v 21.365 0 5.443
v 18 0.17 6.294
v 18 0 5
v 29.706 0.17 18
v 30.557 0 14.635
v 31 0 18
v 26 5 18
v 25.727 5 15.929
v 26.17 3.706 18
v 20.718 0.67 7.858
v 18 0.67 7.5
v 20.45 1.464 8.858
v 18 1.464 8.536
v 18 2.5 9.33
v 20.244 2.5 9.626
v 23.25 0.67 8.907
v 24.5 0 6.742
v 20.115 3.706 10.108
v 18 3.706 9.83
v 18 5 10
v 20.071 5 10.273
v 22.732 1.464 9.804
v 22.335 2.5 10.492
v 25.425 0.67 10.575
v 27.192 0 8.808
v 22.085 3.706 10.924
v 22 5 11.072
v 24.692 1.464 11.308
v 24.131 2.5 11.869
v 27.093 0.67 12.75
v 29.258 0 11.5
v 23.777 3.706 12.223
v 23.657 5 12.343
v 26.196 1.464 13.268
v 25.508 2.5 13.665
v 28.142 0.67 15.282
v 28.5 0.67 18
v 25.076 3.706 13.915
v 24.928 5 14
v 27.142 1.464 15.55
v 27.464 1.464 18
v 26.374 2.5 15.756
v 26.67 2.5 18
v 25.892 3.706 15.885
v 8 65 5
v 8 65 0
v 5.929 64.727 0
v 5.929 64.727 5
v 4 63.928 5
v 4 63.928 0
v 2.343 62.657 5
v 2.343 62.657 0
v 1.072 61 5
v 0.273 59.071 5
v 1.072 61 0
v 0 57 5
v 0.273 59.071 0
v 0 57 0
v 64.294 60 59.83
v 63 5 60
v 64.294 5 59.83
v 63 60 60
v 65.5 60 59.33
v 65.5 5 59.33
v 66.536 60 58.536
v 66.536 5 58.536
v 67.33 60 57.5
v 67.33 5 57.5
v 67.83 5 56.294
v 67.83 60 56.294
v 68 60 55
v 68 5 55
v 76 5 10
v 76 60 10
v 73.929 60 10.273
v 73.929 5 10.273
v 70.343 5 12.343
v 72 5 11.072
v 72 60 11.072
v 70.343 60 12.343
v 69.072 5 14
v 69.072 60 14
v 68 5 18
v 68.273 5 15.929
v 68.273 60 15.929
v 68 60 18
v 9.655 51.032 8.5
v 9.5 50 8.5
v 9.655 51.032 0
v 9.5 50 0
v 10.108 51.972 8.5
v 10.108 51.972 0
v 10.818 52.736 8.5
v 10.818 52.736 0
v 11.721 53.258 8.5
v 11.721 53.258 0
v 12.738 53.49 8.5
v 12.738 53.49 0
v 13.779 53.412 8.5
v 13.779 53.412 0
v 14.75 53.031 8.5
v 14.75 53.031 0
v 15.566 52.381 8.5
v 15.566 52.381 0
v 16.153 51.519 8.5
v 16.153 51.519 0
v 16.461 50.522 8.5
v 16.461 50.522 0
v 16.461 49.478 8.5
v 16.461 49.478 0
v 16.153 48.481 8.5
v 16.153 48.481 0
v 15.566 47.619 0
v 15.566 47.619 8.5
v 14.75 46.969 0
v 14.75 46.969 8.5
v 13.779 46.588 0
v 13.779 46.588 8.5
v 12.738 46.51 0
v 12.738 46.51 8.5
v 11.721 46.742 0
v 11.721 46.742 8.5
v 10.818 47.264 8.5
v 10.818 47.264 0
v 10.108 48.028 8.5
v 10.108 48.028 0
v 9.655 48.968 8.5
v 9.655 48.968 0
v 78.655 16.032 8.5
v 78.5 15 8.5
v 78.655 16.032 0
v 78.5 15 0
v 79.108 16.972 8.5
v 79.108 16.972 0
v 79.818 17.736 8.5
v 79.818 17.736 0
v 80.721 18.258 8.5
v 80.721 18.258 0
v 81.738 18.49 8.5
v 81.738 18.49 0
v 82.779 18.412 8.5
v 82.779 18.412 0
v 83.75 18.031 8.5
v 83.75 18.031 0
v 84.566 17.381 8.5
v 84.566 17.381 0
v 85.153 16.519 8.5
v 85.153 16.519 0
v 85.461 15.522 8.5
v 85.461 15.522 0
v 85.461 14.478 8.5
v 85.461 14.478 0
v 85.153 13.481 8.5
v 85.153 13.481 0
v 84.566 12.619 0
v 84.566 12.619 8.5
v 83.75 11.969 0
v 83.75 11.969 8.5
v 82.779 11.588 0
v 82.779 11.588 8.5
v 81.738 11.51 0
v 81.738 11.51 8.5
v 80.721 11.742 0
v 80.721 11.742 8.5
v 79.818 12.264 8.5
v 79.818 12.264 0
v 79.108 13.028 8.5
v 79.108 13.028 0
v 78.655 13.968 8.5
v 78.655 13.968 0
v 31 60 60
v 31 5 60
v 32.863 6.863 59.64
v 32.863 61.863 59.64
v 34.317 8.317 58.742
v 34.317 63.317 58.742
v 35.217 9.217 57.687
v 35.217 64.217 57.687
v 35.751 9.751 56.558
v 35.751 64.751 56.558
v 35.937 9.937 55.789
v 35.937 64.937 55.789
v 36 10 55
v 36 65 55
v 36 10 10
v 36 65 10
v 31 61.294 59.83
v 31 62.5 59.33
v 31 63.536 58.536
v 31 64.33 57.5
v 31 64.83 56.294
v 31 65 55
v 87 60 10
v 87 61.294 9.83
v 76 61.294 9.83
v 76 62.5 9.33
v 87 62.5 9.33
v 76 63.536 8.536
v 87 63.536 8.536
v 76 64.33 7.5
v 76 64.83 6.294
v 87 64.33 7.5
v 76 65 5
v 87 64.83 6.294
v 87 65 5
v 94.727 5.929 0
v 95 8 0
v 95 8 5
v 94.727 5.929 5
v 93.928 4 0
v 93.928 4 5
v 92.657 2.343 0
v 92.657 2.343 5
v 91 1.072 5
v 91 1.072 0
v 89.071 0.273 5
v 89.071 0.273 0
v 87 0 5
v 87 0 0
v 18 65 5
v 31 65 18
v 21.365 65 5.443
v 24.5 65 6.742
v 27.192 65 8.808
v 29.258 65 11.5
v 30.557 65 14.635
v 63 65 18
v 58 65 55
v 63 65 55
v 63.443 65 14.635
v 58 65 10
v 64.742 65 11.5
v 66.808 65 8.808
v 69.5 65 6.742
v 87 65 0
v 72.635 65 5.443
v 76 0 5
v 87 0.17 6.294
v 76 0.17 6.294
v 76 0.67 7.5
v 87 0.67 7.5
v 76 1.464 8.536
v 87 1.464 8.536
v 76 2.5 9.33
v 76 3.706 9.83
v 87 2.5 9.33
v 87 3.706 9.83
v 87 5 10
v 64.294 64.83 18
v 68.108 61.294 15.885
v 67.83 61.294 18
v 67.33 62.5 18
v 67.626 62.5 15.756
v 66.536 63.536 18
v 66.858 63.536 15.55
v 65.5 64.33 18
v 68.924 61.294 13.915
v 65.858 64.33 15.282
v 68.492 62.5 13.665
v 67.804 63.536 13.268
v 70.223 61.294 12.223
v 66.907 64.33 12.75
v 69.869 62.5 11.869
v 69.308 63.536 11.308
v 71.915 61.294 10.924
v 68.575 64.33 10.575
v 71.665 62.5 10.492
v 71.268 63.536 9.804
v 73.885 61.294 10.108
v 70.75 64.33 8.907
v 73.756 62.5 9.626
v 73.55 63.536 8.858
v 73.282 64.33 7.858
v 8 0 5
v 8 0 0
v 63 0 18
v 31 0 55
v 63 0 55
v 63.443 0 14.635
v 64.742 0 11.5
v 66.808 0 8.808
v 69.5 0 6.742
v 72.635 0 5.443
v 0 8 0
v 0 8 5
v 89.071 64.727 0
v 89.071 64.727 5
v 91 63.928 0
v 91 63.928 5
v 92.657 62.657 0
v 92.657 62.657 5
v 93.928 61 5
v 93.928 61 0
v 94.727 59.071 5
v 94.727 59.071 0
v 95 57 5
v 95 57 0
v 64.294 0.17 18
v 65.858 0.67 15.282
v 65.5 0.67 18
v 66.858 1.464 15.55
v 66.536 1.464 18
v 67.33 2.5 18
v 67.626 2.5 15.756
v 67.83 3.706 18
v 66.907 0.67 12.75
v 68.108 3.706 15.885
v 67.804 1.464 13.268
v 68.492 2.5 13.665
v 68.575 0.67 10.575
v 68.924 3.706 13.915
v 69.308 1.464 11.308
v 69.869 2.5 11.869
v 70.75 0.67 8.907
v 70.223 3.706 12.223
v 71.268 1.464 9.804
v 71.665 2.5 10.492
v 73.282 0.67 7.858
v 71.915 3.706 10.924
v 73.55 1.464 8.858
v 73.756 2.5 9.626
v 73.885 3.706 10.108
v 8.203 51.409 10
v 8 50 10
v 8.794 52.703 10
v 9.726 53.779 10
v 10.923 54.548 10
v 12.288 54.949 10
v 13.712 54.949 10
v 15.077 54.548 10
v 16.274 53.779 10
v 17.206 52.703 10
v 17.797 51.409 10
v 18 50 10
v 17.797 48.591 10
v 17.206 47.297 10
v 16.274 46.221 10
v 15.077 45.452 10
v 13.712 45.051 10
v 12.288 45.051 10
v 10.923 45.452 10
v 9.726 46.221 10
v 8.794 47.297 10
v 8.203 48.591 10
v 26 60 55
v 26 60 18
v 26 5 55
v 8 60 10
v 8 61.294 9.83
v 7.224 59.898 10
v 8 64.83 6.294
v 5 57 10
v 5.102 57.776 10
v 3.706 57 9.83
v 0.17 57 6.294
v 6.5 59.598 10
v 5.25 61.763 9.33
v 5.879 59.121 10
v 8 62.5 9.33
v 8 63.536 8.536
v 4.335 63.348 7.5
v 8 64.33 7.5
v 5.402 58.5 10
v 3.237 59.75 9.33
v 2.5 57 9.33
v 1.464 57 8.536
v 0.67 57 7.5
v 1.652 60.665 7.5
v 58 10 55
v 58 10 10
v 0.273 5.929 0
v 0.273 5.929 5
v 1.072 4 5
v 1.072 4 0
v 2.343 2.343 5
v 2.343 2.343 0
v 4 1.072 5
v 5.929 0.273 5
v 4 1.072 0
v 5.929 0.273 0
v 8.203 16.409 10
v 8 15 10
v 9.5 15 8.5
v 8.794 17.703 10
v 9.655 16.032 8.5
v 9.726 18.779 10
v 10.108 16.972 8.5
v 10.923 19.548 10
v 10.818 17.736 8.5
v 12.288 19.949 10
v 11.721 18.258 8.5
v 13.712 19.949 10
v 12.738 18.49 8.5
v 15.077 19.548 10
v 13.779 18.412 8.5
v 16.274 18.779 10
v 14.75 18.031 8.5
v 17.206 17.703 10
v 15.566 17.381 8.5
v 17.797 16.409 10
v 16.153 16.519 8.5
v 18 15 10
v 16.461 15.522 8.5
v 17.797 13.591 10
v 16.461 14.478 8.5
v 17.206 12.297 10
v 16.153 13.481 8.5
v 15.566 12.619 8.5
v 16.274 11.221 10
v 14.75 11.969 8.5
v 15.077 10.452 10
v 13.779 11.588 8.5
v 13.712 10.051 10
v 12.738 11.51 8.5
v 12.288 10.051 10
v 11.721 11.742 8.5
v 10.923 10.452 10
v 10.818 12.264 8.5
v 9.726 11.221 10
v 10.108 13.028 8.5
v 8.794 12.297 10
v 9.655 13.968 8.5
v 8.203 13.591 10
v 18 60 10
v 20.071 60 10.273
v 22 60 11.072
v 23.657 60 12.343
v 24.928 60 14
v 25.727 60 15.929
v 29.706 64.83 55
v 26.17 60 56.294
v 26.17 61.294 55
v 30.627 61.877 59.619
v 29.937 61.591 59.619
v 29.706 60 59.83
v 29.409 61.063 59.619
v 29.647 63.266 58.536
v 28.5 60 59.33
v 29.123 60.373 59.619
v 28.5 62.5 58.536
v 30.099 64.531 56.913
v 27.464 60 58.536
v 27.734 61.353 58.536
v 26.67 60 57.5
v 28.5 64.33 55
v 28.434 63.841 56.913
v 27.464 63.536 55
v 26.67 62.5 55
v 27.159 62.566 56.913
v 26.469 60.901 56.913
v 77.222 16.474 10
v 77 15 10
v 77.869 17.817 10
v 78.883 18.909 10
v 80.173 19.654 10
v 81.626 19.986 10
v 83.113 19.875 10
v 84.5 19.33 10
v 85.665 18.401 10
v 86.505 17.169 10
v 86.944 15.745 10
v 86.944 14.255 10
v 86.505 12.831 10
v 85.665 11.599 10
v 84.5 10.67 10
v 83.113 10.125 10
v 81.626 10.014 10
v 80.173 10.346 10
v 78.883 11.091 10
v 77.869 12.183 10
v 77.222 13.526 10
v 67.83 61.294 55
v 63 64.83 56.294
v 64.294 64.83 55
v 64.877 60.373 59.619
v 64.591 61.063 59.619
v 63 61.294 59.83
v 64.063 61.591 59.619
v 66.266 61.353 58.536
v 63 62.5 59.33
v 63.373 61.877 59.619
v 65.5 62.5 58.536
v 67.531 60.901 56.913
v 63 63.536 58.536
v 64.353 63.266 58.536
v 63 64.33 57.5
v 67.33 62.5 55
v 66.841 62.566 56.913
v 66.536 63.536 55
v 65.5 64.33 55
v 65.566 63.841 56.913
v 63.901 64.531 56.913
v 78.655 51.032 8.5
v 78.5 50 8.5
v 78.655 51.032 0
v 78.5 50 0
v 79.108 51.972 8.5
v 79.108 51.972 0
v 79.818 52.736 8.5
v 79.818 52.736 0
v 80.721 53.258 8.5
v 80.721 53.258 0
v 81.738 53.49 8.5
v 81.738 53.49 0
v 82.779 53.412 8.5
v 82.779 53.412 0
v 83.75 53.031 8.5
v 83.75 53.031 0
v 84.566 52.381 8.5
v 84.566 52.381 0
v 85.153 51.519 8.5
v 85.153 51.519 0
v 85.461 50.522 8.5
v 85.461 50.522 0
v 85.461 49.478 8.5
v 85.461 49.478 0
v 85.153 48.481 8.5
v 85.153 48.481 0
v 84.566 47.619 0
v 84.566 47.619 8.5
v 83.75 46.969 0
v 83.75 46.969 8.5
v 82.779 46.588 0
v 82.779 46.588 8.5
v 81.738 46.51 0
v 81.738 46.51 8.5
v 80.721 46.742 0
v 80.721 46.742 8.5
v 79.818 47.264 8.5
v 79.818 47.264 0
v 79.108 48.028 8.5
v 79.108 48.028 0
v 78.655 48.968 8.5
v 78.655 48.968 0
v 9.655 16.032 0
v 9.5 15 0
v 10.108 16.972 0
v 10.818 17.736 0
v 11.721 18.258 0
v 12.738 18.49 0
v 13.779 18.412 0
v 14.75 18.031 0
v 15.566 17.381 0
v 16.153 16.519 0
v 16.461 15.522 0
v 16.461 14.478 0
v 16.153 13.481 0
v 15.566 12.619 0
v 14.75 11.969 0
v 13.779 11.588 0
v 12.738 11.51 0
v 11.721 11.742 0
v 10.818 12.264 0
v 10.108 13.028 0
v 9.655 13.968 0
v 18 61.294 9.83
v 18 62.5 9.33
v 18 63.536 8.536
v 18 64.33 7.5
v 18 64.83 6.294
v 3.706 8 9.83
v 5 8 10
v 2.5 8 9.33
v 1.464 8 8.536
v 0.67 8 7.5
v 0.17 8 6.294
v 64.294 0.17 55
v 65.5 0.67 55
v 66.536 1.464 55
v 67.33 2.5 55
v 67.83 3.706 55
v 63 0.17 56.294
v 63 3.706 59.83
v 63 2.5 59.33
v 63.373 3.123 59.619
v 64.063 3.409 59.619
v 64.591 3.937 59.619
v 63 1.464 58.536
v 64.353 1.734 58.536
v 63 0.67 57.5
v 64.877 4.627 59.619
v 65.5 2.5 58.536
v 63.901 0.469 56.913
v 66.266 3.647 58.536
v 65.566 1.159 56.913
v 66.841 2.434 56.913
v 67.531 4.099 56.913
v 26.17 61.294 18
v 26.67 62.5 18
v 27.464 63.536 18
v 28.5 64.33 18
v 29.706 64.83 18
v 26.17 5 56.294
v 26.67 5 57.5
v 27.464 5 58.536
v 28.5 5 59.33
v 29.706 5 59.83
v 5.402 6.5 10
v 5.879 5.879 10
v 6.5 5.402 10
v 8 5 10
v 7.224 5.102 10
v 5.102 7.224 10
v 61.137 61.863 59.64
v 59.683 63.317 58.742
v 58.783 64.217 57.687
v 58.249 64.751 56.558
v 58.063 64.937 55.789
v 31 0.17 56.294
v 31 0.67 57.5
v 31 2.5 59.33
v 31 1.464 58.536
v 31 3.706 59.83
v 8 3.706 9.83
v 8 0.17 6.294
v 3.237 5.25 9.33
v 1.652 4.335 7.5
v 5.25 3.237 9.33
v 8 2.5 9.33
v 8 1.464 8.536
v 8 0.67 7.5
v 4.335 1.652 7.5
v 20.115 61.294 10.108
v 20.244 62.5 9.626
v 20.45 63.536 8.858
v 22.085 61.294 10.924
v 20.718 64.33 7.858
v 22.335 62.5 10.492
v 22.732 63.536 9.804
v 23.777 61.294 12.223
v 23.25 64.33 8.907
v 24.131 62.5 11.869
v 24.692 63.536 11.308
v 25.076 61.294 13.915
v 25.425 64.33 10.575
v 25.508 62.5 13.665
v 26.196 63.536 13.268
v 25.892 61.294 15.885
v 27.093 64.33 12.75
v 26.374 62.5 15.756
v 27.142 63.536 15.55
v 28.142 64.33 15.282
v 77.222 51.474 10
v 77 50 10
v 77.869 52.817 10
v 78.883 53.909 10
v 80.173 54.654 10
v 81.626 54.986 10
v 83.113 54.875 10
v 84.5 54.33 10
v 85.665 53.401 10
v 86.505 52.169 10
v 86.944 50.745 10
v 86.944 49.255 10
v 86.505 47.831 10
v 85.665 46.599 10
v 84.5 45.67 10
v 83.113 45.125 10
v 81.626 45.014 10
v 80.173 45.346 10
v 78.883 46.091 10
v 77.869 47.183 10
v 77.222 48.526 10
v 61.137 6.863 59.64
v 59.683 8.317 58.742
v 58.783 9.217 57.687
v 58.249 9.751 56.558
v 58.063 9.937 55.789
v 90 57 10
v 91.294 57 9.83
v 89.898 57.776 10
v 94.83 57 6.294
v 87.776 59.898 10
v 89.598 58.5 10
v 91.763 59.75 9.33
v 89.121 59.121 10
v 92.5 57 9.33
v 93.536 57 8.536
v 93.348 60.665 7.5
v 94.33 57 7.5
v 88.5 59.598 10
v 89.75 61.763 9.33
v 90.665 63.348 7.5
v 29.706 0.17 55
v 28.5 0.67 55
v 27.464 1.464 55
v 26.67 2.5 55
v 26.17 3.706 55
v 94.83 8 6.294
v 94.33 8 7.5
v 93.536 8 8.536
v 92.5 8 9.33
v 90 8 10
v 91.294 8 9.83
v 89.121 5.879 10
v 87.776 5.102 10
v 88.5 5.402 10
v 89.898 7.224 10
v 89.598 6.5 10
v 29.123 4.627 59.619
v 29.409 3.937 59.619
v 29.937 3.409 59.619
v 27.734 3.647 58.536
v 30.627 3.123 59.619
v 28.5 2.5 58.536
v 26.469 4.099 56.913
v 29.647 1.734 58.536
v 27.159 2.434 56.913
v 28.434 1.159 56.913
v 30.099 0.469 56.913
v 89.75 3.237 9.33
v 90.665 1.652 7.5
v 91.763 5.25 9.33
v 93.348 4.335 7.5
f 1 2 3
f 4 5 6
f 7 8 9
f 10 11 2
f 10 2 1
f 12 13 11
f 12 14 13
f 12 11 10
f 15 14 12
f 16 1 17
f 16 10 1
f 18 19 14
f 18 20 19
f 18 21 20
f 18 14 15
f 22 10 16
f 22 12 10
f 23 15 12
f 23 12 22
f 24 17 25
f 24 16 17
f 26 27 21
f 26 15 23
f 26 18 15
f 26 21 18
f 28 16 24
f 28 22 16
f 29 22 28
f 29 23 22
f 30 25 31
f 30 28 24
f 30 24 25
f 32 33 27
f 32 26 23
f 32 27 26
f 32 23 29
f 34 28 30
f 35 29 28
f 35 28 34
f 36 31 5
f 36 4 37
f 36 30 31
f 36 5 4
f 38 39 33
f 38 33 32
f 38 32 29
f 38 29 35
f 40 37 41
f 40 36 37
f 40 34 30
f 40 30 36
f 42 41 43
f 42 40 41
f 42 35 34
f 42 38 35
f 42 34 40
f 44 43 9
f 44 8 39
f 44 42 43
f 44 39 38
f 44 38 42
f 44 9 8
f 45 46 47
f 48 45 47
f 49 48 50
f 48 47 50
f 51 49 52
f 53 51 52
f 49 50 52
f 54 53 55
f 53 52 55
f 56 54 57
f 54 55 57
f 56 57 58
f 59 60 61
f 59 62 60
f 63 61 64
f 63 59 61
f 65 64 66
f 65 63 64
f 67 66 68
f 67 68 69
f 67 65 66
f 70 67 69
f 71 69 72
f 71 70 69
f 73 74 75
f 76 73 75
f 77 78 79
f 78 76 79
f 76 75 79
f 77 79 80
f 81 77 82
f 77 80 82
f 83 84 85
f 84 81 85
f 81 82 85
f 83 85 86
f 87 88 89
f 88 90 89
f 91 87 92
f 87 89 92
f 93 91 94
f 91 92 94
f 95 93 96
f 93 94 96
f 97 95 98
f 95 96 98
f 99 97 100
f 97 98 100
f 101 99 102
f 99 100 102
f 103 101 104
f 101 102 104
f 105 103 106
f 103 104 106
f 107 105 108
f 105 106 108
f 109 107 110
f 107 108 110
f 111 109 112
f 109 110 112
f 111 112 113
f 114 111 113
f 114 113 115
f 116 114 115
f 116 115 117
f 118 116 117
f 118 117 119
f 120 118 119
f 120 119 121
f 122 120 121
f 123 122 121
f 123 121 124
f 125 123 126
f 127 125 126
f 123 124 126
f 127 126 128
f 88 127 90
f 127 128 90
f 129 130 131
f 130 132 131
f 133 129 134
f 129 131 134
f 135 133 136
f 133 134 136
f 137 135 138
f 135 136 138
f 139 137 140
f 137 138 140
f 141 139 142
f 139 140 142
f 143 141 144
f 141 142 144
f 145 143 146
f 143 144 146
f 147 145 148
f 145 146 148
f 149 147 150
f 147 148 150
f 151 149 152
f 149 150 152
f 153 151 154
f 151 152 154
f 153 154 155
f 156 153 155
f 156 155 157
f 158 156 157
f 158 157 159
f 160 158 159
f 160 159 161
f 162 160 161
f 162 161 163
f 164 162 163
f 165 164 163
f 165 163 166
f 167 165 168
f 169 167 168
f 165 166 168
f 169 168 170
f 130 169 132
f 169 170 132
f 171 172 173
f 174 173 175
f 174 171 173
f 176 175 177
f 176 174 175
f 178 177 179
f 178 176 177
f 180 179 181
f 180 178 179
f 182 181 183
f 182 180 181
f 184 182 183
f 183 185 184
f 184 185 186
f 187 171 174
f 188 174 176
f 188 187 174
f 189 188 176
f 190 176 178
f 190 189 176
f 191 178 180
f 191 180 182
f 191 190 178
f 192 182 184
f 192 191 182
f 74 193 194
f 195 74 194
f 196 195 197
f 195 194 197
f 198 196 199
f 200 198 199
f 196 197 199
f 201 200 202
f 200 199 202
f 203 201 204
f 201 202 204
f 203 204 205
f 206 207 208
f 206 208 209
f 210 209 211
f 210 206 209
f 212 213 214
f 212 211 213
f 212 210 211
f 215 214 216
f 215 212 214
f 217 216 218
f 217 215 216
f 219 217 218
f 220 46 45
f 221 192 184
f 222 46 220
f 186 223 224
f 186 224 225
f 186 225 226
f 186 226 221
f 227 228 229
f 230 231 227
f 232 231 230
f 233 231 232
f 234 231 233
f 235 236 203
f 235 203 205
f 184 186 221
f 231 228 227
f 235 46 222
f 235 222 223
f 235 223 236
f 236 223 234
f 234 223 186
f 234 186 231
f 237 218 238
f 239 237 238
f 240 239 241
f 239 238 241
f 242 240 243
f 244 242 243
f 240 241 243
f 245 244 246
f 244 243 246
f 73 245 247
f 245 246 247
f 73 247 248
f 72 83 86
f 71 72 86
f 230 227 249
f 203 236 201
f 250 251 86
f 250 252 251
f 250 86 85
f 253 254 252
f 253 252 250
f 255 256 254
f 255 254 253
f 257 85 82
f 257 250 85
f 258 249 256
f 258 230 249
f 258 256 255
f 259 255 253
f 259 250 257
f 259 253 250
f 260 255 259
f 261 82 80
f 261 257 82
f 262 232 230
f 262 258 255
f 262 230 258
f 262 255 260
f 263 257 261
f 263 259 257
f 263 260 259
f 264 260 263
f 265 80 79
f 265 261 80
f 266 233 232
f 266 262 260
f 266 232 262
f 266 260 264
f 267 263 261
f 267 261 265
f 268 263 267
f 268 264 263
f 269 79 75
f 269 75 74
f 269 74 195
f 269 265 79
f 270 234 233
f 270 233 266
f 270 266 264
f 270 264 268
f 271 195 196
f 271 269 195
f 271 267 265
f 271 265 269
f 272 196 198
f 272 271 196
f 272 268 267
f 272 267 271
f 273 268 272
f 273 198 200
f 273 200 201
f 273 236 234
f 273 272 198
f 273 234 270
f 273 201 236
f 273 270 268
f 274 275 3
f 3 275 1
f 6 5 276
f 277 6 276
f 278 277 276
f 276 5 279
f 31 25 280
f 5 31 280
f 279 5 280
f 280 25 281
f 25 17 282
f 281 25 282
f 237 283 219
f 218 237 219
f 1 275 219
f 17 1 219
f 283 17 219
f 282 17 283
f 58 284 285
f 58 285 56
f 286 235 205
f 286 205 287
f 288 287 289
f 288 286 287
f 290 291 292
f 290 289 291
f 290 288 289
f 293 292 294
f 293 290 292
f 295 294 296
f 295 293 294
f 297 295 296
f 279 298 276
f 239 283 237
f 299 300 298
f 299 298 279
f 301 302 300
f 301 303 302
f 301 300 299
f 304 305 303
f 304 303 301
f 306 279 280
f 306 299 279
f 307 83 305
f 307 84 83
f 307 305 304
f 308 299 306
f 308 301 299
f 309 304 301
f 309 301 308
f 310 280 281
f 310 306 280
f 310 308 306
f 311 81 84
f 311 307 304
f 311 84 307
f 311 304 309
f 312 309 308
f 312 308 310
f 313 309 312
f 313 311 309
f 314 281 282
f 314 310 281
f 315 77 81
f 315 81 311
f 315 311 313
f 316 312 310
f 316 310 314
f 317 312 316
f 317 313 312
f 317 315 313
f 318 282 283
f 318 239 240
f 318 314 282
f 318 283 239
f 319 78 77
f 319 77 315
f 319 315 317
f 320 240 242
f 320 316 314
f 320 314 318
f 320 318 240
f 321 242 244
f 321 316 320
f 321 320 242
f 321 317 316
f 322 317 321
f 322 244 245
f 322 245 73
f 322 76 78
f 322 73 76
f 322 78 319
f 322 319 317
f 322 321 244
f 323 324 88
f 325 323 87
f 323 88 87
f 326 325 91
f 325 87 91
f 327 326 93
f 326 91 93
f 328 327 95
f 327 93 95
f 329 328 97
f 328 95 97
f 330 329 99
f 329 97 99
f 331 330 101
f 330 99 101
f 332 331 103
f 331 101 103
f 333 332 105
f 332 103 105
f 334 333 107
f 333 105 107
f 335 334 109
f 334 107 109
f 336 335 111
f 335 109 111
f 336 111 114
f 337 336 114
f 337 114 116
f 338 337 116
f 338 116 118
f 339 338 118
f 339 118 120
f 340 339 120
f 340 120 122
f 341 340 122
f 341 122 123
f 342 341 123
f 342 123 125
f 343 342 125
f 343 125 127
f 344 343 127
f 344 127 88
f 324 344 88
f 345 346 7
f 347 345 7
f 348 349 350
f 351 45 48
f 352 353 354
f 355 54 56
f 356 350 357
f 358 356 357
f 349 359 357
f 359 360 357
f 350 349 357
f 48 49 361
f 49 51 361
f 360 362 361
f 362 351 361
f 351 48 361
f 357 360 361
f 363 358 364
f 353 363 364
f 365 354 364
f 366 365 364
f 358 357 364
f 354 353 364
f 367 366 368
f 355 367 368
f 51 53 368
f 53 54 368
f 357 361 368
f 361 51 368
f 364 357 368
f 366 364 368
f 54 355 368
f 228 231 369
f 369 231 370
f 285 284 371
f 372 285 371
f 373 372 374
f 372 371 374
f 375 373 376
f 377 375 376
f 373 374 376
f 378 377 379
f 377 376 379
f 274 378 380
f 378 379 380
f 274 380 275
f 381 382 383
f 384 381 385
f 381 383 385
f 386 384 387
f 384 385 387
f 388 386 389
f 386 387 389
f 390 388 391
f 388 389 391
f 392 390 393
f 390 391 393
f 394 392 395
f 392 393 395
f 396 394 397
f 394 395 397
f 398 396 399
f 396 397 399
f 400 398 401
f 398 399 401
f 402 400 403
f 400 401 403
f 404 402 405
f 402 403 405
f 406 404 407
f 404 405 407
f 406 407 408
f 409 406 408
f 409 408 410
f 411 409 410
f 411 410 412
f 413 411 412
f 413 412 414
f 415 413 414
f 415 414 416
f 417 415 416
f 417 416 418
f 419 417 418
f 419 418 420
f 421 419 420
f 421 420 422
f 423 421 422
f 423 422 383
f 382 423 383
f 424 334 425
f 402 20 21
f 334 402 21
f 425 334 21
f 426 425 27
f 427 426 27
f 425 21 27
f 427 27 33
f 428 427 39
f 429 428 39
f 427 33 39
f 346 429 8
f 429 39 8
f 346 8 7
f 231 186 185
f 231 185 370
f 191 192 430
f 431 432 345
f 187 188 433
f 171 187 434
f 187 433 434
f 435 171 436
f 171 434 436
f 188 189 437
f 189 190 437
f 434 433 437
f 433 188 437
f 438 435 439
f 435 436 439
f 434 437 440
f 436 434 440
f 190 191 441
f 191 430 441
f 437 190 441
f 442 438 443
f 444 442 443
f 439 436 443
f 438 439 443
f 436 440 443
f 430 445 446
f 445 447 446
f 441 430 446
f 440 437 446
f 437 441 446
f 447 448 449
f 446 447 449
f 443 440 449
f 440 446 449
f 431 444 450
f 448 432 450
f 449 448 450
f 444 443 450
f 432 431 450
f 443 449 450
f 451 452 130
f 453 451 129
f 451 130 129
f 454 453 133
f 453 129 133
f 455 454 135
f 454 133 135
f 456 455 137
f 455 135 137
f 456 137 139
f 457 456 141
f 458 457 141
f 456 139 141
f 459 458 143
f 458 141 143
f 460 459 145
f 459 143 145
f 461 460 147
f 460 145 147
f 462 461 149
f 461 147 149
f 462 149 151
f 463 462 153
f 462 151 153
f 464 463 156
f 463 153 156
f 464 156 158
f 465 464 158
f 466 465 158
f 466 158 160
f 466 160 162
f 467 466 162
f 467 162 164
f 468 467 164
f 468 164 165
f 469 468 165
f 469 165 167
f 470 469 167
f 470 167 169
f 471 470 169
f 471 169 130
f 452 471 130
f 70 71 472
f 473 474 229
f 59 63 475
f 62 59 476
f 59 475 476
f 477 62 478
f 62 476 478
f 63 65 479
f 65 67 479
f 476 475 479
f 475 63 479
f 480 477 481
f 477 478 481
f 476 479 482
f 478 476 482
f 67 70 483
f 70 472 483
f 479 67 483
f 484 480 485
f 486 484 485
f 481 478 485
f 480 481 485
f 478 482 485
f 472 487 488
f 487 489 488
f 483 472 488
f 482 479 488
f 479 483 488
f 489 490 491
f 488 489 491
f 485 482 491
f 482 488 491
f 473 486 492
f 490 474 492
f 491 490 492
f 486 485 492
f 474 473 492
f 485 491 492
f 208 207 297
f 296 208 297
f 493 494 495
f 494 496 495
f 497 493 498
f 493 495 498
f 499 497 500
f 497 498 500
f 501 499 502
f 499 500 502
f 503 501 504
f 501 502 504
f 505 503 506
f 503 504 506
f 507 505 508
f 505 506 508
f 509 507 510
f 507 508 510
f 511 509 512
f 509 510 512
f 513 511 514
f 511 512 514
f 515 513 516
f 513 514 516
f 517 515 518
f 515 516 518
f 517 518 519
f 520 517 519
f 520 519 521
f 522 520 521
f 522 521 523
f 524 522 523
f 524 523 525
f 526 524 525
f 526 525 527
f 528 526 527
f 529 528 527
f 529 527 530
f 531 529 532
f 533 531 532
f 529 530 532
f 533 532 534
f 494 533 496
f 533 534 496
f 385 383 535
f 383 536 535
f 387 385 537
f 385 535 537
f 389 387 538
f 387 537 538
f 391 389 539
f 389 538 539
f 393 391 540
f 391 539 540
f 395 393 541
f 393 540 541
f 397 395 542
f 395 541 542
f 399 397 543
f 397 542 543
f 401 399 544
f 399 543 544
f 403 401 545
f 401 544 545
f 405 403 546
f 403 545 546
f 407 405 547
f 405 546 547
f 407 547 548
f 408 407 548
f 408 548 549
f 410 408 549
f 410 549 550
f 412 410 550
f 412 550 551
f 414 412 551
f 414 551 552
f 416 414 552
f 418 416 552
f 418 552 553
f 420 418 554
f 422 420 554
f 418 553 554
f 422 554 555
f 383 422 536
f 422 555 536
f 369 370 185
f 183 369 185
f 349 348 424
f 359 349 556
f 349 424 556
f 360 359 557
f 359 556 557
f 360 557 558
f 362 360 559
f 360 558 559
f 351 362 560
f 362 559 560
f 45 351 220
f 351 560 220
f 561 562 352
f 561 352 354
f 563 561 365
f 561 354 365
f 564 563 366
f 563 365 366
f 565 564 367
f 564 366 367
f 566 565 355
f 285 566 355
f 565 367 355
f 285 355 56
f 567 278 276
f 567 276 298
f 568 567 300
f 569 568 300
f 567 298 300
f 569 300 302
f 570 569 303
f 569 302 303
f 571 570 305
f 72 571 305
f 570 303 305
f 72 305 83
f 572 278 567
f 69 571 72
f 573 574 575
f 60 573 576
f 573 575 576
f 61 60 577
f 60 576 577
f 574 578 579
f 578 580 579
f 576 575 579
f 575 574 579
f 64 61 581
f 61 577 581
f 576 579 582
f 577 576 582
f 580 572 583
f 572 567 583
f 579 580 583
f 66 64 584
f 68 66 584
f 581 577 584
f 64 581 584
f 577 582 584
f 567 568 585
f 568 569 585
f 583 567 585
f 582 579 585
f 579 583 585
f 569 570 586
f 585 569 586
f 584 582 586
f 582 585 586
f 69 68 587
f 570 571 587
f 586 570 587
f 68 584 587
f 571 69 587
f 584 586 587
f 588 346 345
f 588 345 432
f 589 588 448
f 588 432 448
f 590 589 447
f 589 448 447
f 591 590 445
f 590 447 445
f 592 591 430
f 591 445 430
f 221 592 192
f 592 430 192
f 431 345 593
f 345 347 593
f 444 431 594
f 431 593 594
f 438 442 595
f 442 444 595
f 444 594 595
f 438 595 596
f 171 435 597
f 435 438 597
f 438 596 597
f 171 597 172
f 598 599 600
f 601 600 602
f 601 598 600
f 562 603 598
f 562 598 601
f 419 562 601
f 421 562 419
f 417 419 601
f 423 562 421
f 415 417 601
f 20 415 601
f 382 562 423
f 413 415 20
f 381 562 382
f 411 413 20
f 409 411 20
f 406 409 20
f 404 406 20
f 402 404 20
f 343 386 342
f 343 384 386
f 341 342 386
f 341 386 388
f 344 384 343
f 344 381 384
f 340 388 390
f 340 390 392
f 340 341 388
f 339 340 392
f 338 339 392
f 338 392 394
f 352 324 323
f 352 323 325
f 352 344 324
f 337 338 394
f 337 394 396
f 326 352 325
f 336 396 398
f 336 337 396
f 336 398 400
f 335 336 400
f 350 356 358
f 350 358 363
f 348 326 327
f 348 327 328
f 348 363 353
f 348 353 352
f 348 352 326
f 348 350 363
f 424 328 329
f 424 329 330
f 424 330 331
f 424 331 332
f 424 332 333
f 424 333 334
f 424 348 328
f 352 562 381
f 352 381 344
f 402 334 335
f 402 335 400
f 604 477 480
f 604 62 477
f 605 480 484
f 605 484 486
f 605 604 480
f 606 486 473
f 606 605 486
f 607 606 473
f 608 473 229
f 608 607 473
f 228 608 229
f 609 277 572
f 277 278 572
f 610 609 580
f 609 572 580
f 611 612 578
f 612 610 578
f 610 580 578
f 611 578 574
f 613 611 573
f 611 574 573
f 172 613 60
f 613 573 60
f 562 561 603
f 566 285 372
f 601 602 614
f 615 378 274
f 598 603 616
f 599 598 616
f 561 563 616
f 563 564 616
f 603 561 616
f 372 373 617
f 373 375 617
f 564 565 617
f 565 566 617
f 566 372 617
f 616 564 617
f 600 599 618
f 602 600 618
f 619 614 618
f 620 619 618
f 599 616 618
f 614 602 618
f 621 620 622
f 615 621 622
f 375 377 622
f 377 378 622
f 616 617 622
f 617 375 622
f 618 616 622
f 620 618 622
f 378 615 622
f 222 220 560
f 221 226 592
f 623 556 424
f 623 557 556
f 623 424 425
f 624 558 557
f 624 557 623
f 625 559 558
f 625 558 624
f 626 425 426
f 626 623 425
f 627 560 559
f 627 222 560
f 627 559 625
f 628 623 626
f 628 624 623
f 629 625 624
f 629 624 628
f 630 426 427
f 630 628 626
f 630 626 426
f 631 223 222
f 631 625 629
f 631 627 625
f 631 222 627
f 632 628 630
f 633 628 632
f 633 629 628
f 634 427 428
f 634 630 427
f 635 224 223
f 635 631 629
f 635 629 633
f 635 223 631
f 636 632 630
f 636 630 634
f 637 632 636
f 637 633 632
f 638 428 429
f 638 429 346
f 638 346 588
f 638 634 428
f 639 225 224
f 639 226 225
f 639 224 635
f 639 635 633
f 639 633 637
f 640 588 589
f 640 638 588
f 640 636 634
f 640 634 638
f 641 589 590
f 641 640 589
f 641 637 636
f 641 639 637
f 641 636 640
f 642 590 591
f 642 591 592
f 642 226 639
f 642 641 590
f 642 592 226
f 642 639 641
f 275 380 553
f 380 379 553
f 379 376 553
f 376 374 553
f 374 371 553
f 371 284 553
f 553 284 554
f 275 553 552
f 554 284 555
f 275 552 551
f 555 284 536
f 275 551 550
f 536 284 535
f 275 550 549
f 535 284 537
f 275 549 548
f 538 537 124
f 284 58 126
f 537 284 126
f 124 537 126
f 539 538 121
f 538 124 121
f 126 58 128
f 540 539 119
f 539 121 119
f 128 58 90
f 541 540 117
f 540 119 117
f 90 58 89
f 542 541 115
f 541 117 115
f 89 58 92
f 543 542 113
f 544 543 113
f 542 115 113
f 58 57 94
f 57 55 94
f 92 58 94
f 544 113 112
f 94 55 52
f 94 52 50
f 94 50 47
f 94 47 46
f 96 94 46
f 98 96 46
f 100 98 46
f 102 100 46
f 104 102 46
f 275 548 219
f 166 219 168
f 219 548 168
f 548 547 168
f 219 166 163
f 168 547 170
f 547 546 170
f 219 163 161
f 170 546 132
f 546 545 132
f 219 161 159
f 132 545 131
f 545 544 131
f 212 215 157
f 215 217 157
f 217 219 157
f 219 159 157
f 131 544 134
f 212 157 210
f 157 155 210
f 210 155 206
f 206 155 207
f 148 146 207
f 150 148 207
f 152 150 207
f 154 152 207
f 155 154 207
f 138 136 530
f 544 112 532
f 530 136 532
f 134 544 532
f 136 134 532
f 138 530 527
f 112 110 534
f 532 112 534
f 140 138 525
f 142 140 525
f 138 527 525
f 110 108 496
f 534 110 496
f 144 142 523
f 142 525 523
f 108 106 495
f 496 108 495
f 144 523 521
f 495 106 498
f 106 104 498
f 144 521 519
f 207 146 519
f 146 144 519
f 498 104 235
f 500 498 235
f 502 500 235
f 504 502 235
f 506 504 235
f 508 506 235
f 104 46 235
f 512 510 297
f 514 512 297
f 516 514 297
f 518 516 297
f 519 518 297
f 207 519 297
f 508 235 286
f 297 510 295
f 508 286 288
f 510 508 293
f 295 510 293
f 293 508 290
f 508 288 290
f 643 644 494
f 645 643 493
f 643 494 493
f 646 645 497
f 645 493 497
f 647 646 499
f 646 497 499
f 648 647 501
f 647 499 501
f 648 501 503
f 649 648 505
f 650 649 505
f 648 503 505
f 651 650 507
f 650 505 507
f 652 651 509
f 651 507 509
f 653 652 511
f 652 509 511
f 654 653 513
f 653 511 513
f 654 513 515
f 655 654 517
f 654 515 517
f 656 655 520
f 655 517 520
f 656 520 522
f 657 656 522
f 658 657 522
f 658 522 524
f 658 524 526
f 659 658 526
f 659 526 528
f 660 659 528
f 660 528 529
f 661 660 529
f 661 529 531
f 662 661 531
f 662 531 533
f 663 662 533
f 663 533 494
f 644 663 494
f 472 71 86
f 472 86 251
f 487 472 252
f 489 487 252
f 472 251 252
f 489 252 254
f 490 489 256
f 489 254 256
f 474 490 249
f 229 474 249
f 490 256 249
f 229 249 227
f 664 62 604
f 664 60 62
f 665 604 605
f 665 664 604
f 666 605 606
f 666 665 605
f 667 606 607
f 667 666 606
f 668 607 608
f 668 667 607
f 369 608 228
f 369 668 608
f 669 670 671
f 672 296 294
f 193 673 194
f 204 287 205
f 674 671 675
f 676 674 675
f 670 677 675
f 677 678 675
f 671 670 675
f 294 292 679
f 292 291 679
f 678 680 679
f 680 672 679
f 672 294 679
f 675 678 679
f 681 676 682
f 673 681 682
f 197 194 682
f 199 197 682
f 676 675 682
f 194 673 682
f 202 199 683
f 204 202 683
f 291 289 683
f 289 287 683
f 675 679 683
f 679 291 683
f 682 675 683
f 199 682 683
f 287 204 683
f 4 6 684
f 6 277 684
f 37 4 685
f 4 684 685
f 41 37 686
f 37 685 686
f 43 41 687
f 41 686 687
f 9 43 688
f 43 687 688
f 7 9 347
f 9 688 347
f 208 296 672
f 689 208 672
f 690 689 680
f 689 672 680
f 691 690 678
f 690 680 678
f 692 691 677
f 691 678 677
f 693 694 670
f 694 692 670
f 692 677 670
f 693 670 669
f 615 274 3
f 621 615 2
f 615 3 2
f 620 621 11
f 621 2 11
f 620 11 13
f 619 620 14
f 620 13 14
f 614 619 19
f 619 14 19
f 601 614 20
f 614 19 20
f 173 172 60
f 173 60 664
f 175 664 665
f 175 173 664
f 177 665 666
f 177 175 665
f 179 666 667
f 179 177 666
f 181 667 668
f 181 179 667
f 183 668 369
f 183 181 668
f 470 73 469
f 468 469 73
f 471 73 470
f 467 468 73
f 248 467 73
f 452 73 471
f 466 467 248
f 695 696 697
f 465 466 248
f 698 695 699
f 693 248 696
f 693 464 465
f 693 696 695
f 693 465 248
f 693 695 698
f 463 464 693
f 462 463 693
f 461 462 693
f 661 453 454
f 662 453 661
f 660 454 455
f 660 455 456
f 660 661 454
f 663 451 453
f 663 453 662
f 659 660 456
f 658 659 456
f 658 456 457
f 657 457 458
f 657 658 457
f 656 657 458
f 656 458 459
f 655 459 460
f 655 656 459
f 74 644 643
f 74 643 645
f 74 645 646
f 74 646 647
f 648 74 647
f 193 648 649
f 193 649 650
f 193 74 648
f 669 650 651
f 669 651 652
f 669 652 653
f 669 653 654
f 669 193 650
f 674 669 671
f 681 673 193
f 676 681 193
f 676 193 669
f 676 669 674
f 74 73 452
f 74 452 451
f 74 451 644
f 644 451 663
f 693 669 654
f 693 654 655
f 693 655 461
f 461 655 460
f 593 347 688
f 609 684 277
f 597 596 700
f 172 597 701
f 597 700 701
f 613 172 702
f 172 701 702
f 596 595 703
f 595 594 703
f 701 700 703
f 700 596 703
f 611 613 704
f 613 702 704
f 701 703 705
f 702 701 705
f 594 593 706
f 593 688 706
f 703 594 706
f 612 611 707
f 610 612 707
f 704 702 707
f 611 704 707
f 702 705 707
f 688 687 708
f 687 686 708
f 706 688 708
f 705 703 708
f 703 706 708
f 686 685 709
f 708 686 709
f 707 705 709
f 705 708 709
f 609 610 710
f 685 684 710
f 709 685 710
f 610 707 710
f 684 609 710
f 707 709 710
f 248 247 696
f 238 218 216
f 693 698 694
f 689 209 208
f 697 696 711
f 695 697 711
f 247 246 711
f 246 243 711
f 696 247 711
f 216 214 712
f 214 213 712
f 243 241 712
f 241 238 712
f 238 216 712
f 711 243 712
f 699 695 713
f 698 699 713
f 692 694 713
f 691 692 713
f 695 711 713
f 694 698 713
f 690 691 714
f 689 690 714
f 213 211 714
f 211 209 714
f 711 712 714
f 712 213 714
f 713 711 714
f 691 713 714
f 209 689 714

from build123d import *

# Parameters (mm, degrees)
F0_W           = 95
F0_H           = 65
F1_DEPTH       = 10
F3_DEPTH       = 50
F4_R           = 8
F5_R           = 4.99999
F7_D           = 7
F7_CSINK_D     = 10
F7_CSINK_ANGLE = 90
F8_T1_DEPTH    = 30
F8_T4_ANGLE    = 90
F8_T6_ANGLE    = 90
F8_T8_ANGLE    = 90
F8_T10_ANGLE   = 90


# Not quite as in the source:
# - a fillet or chamfer that OpenCascade refuses, or shapes differently, is made with other operations: its cross-section is extruded or revolved along the edge and cut away or added
# - a fillet or chamfer is up to 0.001 mm smaller than in the source, because OpenCascade refuses the exact size


with BuildPart() as f1:
    # F0 (on Top) → F1 (new body)
    with BuildSketch(Plane.XY):
        with Locations((47.5, 32.5)):
            Rectangle(F0_W, F0_H)
    extrude(amount=F1_DEPTH)

    # F2 (on face) → F3 (join)
    with BuildSketch(Plane.XY.offset(10)):
        Polygon((36, 65), (26, 65), (26, 0), (68, 0), (68, 65), (58, 65), (58, 10), (36, 10), align=None)
    extrude(amount=F3_DEPTH)

    # F4
    f4_edges = [f1.edges().sort_by_distance(p)[0] for p in [
        (68, 32.5, 10),
        (26, 32.5, 10),
    ]]
    fillet(f4_edges, radius=F4_R)

    # F5 (radius 5 in the source; OpenCascade refuses exactly that, so slightly less here)
    f5_edges = [f1.edges().sort_by_distance(p)[0] for p in [
        (85.5, 65, 10),
        (76, 32.5, 10),
        (95, 32.5, 10),
        (85.5, 0, 10),
        (9, 65, 10),
        (18, 32.5, 10),
        (0, 32.5, 10),
        (9, 0, 10),
        (31, 65, 60),
        (26, 32.5, 60),
        (47, 0, 60),
        (68, 32.5, 60),
        (63, 65, 60),
        (58, 37.5, 60),
        (47, 10, 60),
        (36, 37.5, 60),
    ]]
    fillet(f5_edges, radius=F5_R)

    # F7 (through all)
    with Locations(Plane.XY.offset(10)):
        with Locations((13, 50), (13, 15), (82, 50), (82, 15)):
            CounterSinkHole(F7_D / 2, F7_CSINK_D / 2, counter_sink_angle=F7_CSINK_ANGLE)

    # F8: fillet of radius 8 on 4 edges, made by hand

    # F8_s2 → F8_t1 (cut)
    with BuildSketch(Plane.XY.offset(-20)):
        with BuildLine():
            ThreePointArc((8, 65), (2.3431457505, 62.6568542495), (0, 57))
            Line((0, 57), (0, 65))
            Line((0, 65), (8, 65))
        make_face()
        with BuildLine():
            ThreePointArc((87, 65), (92.6568542495, 62.6568542495), (95, 57))
            Line((95, 57), (95, 65))
            Line((95, 65), (87, 65))
        make_face()
        with BuildLine():
            ThreePointArc((95, 8), (92.6568542495, 2.3431457505), (87, 0))
            Line((87, 0), (95, 0))
            Line((95, 0), (95, 8))
        make_face()
        with BuildLine():
            ThreePointArc((0, 8), (2.3431457505, 2.3431457505), (8, 0))
            Line((8, 0), (0, 0))
            Line((0, 0), (0, 8))
        make_face()
    extrude(amount=F8_T1_DEPTH, mode=Mode.SUBTRACT)

    # F8_s3 → F8_t4 (revolve, cut)
    with BuildSketch(Plane.XZ.offset(-8)):
        with BuildLine():
            ThreePointArc((4.99999, 10), (1.4644631651, 8.5355368349), (0, 5.00001))
            Line((0, 5.00001), (0, 10))
            Line((0, 10), (4.99999, 10))
        make_face()
    revolve(axis=Axis((8, 8, 10), (0, 0, 1)), revolution_arc=F8_T4_ANGLE, mode=Mode.SUBTRACT)

    # F8_s5 → F8_t6 (revolve, cut)
    with BuildSketch(Plane.YZ.offset(87)):
        with BuildLine():
            ThreePointArc((4.99999, 10), (1.4644631651, 8.5355368349), (0, 5.00001))
            Line((0, 5.00001), (0, 10))
            Line((0, 10), (4.99999, 10))
        make_face()
    revolve(axis=Axis((87, 8, 10), (0, 0, 1)), revolution_arc=F8_T6_ANGLE, mode=Mode.SUBTRACT)

    # F8_s7 → F8_t8 (revolve, cut)
    with BuildSketch(Plane.XZ.offset(-57)):
        with BuildLine():
            ThreePointArc((90.00001, 10), (93.5355368349, 8.5355368349), (95, 5.00001))
            Line((95, 5.00001), (95, 10))
            Line((95, 10), (90.00001, 10))
        make_face()
    revolve(axis=Axis((87, 57, 10), (0, 0, 1)), revolution_arc=F8_T8_ANGLE, mode=Mode.SUBTRACT)

    # F8_s9 → F8_t10 (revolve, cut)
    with BuildSketch(Plane.YZ.offset(8)):
        with BuildLine():
            ThreePointArc((60.00001, 10), (63.5355368349, 8.5355368349), (65, 5.00001))
            Line((65, 5.00001), (65, 10))
            Line((65, 10), (60.00001, 10))
        make_face()
    revolve(axis=Axis((8, 57, 10), (0, 0, 1)), revolution_arc=F8_T10_ANGLE, mode=Mode.SUBTRACT)


solid = f1.part
